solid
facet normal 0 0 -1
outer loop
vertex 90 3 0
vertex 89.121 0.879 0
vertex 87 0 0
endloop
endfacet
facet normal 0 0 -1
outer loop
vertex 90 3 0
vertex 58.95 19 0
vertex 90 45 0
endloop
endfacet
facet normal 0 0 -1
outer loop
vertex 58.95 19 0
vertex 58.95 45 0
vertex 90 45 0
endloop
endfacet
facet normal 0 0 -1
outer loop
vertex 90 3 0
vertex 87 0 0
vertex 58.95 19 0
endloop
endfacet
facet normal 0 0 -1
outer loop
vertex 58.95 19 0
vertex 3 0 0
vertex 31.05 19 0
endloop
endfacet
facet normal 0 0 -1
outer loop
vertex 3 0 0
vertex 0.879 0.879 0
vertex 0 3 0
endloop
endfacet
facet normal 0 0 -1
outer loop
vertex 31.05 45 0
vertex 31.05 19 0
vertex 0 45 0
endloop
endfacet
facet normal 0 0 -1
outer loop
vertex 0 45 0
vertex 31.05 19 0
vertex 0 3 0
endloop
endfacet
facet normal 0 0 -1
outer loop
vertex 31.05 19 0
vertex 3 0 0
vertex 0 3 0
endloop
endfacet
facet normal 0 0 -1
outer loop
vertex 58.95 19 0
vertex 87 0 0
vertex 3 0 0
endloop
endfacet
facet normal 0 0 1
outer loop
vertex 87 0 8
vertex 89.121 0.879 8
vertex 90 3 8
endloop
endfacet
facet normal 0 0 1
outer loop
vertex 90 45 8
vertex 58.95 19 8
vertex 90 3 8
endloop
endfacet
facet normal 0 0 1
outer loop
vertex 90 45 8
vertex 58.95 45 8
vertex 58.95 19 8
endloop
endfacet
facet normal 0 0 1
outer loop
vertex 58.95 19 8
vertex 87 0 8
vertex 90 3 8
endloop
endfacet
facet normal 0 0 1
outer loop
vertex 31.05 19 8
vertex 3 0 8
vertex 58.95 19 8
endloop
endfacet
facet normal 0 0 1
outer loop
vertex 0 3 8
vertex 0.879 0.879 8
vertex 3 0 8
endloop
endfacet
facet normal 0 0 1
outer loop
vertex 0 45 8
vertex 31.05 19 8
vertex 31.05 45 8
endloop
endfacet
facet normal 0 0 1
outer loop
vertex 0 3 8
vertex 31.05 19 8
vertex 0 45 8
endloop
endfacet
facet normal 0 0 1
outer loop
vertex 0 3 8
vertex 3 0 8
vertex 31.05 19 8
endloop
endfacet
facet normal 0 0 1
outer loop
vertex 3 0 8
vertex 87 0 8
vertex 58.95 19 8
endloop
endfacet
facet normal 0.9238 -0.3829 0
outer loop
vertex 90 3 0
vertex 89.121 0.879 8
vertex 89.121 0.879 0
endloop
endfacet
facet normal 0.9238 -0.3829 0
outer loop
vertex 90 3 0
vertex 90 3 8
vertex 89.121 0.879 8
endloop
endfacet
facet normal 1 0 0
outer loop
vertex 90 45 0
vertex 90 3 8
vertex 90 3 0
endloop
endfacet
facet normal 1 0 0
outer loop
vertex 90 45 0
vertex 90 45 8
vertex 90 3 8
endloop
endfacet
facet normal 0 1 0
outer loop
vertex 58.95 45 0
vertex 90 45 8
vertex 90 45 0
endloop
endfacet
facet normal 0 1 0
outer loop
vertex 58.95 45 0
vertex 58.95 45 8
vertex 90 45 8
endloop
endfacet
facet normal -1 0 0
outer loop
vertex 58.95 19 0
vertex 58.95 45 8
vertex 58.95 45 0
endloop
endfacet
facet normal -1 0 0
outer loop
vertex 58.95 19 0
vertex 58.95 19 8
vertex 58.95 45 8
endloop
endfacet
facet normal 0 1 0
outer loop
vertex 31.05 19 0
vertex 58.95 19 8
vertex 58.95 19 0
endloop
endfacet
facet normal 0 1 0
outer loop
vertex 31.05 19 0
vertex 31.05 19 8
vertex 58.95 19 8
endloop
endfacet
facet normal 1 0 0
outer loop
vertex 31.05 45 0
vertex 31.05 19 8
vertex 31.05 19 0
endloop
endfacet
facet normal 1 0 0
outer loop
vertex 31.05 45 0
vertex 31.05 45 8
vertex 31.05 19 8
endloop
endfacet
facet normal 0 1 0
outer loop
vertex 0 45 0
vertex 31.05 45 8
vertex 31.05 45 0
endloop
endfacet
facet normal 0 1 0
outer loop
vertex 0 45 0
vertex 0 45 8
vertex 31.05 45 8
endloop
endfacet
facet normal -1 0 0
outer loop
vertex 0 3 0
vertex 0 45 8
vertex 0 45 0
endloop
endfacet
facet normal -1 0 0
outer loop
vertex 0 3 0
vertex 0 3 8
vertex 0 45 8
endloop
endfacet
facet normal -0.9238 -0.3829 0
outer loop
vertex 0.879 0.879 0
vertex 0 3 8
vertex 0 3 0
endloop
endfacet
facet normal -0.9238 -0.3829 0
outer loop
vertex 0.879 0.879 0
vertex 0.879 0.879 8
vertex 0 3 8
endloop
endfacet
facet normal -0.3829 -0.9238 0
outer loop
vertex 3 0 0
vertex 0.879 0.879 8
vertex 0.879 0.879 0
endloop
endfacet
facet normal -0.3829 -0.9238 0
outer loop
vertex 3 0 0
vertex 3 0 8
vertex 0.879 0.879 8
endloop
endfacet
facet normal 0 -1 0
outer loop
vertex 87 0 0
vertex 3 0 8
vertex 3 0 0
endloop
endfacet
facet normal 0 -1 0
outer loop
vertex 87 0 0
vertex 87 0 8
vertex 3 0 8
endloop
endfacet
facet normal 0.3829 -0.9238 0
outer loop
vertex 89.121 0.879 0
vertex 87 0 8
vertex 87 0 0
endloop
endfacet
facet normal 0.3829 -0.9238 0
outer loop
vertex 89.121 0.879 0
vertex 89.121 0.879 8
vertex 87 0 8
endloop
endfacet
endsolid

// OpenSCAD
$fn = 32;
// ----------------------------------------------------------------------
// Window plate: 90 x 45 mm, 1 open windows
// ----------------------------------------------------------------------

// --- parameters (mm) ---
profile_height = 8;       // extrusion height
profile_points = 12;      // points of the closed outline

profile = [[0, 3], [0.879, 0.879], [3, 0], [87, 0], [89.121, 0.879], [90, 3], [90, 45], [58.95, 45], [58.95, 19], [31.05, 19], [31.05, 45], [0, 45]];  // single closed polygon, 12 points, counter clockwise

// --- the one profile operation ---
linear_extrude(height = profile_height) polygon(points = profile);
